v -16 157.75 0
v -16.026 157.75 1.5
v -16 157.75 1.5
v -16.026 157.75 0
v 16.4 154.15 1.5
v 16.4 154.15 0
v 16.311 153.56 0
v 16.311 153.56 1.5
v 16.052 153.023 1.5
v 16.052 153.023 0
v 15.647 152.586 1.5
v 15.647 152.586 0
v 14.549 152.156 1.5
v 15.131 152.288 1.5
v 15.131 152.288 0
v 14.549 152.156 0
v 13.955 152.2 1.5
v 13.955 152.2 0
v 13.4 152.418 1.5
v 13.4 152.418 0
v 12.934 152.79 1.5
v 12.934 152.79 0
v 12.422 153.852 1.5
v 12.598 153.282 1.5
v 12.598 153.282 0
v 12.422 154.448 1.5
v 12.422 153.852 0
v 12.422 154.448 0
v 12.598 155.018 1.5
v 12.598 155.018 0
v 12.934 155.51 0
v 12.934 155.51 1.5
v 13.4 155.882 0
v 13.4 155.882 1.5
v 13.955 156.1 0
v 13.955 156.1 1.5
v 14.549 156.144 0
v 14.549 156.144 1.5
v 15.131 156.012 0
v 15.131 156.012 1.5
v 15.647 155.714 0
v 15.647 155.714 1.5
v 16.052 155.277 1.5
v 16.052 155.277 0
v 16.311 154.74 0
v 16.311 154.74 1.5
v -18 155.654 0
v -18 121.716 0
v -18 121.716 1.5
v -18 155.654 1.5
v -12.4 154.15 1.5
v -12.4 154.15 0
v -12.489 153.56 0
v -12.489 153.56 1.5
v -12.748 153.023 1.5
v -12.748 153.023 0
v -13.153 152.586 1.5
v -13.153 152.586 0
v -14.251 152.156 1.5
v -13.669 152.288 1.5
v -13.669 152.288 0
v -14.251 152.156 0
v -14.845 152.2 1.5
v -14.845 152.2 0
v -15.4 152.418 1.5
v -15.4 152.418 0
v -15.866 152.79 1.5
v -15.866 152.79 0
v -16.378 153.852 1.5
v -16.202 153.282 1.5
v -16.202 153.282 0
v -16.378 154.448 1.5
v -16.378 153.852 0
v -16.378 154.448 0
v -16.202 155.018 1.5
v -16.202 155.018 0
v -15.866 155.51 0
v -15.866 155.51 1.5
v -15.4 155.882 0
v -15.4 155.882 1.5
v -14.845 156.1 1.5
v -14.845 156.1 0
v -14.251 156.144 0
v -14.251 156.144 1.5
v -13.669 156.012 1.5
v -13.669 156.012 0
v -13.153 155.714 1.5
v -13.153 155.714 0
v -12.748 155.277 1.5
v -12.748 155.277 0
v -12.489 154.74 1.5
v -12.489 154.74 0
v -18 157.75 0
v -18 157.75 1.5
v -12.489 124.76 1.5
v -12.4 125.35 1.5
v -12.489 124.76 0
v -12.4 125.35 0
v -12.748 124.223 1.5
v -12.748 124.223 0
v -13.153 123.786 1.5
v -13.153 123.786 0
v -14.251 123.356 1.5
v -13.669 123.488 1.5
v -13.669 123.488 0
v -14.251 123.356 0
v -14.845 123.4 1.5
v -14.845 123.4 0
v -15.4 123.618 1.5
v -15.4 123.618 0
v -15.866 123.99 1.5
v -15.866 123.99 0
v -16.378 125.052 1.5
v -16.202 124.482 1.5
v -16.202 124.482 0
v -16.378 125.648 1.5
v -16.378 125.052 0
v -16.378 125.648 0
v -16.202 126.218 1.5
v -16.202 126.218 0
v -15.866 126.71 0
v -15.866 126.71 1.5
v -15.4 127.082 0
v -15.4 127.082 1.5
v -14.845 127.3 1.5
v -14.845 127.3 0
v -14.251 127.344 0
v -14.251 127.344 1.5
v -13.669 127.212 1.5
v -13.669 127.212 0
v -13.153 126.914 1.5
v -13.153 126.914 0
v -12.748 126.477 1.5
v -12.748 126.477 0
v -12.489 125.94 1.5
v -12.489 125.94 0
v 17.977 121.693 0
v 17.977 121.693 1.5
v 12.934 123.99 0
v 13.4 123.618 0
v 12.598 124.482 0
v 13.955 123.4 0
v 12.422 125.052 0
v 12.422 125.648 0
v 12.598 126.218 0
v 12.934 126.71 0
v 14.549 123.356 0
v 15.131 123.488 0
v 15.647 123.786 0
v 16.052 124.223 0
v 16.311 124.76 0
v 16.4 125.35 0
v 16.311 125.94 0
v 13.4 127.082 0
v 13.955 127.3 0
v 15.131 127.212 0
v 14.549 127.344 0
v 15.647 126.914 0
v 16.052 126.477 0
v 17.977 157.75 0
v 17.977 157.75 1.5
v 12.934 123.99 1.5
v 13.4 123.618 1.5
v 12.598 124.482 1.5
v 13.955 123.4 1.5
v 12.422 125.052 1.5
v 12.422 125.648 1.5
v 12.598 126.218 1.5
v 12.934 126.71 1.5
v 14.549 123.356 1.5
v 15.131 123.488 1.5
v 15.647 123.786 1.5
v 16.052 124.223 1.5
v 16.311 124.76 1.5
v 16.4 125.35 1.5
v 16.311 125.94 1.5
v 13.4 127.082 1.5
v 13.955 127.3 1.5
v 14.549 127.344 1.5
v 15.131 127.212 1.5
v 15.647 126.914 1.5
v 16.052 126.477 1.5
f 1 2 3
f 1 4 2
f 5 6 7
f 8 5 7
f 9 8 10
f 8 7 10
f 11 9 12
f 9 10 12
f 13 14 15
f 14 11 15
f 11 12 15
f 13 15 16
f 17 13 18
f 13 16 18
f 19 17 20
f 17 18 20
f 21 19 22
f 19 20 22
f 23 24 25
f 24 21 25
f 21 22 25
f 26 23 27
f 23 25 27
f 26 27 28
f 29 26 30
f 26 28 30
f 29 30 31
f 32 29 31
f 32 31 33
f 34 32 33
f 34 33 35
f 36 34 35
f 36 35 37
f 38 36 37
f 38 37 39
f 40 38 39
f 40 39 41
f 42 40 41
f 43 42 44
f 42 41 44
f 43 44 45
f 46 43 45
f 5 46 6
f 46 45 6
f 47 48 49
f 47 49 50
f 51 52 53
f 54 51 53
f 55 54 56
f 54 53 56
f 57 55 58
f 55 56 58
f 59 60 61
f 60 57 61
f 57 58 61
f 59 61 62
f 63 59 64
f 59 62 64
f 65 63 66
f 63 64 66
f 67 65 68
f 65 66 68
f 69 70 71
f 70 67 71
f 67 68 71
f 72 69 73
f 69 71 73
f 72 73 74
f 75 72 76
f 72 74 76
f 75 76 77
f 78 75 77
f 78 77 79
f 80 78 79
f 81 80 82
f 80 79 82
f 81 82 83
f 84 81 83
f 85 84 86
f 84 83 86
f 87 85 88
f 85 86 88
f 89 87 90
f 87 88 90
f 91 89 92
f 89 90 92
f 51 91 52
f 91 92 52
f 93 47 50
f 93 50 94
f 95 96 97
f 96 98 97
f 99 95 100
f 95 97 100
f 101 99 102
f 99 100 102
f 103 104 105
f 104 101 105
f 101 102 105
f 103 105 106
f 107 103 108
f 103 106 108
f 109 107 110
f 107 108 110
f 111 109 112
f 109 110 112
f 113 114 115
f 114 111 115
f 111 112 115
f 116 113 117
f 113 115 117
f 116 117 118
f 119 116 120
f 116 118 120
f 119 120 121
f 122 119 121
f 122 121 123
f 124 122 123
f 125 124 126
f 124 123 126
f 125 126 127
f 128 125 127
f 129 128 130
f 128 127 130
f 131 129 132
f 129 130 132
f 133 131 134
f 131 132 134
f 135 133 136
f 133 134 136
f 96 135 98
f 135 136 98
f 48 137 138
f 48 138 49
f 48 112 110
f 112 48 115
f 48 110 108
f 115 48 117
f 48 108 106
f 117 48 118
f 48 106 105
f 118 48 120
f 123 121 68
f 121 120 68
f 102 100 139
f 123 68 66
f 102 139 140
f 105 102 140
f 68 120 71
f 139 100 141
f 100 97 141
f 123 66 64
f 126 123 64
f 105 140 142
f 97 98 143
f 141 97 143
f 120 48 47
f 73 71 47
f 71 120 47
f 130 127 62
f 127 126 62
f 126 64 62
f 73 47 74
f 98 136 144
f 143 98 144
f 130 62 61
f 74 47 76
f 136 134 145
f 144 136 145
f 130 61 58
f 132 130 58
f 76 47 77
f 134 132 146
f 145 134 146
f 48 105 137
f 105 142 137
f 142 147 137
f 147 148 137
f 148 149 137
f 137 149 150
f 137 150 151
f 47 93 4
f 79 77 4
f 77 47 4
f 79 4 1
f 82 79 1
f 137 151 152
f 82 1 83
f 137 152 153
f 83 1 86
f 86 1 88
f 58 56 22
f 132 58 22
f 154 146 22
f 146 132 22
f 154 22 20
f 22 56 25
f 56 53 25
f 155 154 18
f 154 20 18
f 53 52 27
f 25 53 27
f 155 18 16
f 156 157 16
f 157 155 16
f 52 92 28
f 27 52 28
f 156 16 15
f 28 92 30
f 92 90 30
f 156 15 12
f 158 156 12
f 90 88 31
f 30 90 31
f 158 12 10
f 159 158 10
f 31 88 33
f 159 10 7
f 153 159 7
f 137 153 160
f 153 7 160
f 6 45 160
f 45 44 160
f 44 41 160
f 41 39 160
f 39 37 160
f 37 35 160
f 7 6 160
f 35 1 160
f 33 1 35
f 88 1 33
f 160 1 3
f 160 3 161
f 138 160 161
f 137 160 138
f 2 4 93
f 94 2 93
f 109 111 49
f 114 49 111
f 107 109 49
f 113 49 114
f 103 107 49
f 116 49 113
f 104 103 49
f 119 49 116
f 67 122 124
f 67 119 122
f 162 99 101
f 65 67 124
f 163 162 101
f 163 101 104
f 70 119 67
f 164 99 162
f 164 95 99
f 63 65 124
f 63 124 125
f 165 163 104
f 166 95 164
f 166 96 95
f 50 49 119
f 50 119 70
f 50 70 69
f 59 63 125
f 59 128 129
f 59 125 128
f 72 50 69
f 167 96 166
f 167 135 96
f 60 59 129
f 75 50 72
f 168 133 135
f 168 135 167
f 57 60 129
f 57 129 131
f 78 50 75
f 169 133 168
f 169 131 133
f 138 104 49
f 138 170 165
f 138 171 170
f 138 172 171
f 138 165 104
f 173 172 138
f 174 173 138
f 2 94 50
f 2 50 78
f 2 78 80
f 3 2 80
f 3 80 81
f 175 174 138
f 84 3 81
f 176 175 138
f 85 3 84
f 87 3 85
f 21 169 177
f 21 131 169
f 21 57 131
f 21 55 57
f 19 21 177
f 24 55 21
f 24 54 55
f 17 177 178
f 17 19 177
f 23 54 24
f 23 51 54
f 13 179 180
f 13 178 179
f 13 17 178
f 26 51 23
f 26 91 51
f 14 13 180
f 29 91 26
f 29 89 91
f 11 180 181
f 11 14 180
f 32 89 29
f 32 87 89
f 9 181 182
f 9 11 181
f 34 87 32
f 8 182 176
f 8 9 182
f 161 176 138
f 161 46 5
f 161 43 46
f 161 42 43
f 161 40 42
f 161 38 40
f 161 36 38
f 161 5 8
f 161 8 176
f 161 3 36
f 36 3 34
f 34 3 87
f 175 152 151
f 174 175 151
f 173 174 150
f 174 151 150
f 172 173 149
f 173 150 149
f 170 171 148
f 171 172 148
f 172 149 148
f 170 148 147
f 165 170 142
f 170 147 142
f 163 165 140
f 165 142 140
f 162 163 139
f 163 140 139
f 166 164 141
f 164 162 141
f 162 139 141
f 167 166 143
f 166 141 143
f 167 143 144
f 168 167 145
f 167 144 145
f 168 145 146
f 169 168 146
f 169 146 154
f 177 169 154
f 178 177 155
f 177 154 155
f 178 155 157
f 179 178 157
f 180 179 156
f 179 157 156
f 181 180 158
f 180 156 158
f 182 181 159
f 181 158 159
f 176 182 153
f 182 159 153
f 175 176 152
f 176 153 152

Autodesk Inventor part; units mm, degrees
ref_plane "YZ Plane" through (0, 0, 0) normal (1, 0, 0) x (0, 1, 0)
ref_plane "XZ Plane" through (0, 0, 0) normal (0, 1, 0) x (-1, 0, 0)
ref_plane "XY Plane" through (0, 0, 0) normal (0, 0, 1) x (1, 0, 0)
sketch "Szkic1" plane through (0, 0, 0) normal (0, 0, 1) x (1, 0, 0)
  line L0 (-16.0262, 157.75) -> (-18.2115, 157.75)
  line L1 (-18, 155.6545) -> (-18, 158.2708)
  line L2 (-16, 157.75) -> (18, 157.75)
  line L3 (18, 157.75) -> (17.9772, 121.6933)
  line L4 (17.9772, 121.6933) -> (-18.0451, 121.7161)
  line L5 (-18.0451, 121.7161) -> (-18, 157.75)
  circle A0 centre (-14.4, 154.15) radius 2
  circle A1 centre (14.4, 154.15) radius 2
  circle A2 centre (14.4, 125.35) radius 2
  circle A3 centre (-14.4, 125.35) radius 2
  line L6 (17.9772, 121.6933) -> (-18, 121.6933)
  line L7 (-18, 121.6933) -> (-18, 157.75)
  line L8 (-18, 157.75) -> (17.9772, 157.75)
  line L9 (17.9772, 157.75) -> (17.9772, 121.6933)
  circle A4 centre (-14.4, 154.15) radius 2
  circle A5 centre (14.4, 154.15) radius 2
  circle A6 centre (14.4, 125.35) radius 2
  circle A7 centre (-14.4, 125.35) radius 2
  point P0 (0, 0)
  point P1 (17.9772, 157.75)
  point P2 (-18, 121.7161)
extrude "Wyciągnięcie proste1" add sketch "Szkic1" along normal blind 1.5 contours L8 L2 L9 L4 L7 L1 L0
properties part number "płytka"
